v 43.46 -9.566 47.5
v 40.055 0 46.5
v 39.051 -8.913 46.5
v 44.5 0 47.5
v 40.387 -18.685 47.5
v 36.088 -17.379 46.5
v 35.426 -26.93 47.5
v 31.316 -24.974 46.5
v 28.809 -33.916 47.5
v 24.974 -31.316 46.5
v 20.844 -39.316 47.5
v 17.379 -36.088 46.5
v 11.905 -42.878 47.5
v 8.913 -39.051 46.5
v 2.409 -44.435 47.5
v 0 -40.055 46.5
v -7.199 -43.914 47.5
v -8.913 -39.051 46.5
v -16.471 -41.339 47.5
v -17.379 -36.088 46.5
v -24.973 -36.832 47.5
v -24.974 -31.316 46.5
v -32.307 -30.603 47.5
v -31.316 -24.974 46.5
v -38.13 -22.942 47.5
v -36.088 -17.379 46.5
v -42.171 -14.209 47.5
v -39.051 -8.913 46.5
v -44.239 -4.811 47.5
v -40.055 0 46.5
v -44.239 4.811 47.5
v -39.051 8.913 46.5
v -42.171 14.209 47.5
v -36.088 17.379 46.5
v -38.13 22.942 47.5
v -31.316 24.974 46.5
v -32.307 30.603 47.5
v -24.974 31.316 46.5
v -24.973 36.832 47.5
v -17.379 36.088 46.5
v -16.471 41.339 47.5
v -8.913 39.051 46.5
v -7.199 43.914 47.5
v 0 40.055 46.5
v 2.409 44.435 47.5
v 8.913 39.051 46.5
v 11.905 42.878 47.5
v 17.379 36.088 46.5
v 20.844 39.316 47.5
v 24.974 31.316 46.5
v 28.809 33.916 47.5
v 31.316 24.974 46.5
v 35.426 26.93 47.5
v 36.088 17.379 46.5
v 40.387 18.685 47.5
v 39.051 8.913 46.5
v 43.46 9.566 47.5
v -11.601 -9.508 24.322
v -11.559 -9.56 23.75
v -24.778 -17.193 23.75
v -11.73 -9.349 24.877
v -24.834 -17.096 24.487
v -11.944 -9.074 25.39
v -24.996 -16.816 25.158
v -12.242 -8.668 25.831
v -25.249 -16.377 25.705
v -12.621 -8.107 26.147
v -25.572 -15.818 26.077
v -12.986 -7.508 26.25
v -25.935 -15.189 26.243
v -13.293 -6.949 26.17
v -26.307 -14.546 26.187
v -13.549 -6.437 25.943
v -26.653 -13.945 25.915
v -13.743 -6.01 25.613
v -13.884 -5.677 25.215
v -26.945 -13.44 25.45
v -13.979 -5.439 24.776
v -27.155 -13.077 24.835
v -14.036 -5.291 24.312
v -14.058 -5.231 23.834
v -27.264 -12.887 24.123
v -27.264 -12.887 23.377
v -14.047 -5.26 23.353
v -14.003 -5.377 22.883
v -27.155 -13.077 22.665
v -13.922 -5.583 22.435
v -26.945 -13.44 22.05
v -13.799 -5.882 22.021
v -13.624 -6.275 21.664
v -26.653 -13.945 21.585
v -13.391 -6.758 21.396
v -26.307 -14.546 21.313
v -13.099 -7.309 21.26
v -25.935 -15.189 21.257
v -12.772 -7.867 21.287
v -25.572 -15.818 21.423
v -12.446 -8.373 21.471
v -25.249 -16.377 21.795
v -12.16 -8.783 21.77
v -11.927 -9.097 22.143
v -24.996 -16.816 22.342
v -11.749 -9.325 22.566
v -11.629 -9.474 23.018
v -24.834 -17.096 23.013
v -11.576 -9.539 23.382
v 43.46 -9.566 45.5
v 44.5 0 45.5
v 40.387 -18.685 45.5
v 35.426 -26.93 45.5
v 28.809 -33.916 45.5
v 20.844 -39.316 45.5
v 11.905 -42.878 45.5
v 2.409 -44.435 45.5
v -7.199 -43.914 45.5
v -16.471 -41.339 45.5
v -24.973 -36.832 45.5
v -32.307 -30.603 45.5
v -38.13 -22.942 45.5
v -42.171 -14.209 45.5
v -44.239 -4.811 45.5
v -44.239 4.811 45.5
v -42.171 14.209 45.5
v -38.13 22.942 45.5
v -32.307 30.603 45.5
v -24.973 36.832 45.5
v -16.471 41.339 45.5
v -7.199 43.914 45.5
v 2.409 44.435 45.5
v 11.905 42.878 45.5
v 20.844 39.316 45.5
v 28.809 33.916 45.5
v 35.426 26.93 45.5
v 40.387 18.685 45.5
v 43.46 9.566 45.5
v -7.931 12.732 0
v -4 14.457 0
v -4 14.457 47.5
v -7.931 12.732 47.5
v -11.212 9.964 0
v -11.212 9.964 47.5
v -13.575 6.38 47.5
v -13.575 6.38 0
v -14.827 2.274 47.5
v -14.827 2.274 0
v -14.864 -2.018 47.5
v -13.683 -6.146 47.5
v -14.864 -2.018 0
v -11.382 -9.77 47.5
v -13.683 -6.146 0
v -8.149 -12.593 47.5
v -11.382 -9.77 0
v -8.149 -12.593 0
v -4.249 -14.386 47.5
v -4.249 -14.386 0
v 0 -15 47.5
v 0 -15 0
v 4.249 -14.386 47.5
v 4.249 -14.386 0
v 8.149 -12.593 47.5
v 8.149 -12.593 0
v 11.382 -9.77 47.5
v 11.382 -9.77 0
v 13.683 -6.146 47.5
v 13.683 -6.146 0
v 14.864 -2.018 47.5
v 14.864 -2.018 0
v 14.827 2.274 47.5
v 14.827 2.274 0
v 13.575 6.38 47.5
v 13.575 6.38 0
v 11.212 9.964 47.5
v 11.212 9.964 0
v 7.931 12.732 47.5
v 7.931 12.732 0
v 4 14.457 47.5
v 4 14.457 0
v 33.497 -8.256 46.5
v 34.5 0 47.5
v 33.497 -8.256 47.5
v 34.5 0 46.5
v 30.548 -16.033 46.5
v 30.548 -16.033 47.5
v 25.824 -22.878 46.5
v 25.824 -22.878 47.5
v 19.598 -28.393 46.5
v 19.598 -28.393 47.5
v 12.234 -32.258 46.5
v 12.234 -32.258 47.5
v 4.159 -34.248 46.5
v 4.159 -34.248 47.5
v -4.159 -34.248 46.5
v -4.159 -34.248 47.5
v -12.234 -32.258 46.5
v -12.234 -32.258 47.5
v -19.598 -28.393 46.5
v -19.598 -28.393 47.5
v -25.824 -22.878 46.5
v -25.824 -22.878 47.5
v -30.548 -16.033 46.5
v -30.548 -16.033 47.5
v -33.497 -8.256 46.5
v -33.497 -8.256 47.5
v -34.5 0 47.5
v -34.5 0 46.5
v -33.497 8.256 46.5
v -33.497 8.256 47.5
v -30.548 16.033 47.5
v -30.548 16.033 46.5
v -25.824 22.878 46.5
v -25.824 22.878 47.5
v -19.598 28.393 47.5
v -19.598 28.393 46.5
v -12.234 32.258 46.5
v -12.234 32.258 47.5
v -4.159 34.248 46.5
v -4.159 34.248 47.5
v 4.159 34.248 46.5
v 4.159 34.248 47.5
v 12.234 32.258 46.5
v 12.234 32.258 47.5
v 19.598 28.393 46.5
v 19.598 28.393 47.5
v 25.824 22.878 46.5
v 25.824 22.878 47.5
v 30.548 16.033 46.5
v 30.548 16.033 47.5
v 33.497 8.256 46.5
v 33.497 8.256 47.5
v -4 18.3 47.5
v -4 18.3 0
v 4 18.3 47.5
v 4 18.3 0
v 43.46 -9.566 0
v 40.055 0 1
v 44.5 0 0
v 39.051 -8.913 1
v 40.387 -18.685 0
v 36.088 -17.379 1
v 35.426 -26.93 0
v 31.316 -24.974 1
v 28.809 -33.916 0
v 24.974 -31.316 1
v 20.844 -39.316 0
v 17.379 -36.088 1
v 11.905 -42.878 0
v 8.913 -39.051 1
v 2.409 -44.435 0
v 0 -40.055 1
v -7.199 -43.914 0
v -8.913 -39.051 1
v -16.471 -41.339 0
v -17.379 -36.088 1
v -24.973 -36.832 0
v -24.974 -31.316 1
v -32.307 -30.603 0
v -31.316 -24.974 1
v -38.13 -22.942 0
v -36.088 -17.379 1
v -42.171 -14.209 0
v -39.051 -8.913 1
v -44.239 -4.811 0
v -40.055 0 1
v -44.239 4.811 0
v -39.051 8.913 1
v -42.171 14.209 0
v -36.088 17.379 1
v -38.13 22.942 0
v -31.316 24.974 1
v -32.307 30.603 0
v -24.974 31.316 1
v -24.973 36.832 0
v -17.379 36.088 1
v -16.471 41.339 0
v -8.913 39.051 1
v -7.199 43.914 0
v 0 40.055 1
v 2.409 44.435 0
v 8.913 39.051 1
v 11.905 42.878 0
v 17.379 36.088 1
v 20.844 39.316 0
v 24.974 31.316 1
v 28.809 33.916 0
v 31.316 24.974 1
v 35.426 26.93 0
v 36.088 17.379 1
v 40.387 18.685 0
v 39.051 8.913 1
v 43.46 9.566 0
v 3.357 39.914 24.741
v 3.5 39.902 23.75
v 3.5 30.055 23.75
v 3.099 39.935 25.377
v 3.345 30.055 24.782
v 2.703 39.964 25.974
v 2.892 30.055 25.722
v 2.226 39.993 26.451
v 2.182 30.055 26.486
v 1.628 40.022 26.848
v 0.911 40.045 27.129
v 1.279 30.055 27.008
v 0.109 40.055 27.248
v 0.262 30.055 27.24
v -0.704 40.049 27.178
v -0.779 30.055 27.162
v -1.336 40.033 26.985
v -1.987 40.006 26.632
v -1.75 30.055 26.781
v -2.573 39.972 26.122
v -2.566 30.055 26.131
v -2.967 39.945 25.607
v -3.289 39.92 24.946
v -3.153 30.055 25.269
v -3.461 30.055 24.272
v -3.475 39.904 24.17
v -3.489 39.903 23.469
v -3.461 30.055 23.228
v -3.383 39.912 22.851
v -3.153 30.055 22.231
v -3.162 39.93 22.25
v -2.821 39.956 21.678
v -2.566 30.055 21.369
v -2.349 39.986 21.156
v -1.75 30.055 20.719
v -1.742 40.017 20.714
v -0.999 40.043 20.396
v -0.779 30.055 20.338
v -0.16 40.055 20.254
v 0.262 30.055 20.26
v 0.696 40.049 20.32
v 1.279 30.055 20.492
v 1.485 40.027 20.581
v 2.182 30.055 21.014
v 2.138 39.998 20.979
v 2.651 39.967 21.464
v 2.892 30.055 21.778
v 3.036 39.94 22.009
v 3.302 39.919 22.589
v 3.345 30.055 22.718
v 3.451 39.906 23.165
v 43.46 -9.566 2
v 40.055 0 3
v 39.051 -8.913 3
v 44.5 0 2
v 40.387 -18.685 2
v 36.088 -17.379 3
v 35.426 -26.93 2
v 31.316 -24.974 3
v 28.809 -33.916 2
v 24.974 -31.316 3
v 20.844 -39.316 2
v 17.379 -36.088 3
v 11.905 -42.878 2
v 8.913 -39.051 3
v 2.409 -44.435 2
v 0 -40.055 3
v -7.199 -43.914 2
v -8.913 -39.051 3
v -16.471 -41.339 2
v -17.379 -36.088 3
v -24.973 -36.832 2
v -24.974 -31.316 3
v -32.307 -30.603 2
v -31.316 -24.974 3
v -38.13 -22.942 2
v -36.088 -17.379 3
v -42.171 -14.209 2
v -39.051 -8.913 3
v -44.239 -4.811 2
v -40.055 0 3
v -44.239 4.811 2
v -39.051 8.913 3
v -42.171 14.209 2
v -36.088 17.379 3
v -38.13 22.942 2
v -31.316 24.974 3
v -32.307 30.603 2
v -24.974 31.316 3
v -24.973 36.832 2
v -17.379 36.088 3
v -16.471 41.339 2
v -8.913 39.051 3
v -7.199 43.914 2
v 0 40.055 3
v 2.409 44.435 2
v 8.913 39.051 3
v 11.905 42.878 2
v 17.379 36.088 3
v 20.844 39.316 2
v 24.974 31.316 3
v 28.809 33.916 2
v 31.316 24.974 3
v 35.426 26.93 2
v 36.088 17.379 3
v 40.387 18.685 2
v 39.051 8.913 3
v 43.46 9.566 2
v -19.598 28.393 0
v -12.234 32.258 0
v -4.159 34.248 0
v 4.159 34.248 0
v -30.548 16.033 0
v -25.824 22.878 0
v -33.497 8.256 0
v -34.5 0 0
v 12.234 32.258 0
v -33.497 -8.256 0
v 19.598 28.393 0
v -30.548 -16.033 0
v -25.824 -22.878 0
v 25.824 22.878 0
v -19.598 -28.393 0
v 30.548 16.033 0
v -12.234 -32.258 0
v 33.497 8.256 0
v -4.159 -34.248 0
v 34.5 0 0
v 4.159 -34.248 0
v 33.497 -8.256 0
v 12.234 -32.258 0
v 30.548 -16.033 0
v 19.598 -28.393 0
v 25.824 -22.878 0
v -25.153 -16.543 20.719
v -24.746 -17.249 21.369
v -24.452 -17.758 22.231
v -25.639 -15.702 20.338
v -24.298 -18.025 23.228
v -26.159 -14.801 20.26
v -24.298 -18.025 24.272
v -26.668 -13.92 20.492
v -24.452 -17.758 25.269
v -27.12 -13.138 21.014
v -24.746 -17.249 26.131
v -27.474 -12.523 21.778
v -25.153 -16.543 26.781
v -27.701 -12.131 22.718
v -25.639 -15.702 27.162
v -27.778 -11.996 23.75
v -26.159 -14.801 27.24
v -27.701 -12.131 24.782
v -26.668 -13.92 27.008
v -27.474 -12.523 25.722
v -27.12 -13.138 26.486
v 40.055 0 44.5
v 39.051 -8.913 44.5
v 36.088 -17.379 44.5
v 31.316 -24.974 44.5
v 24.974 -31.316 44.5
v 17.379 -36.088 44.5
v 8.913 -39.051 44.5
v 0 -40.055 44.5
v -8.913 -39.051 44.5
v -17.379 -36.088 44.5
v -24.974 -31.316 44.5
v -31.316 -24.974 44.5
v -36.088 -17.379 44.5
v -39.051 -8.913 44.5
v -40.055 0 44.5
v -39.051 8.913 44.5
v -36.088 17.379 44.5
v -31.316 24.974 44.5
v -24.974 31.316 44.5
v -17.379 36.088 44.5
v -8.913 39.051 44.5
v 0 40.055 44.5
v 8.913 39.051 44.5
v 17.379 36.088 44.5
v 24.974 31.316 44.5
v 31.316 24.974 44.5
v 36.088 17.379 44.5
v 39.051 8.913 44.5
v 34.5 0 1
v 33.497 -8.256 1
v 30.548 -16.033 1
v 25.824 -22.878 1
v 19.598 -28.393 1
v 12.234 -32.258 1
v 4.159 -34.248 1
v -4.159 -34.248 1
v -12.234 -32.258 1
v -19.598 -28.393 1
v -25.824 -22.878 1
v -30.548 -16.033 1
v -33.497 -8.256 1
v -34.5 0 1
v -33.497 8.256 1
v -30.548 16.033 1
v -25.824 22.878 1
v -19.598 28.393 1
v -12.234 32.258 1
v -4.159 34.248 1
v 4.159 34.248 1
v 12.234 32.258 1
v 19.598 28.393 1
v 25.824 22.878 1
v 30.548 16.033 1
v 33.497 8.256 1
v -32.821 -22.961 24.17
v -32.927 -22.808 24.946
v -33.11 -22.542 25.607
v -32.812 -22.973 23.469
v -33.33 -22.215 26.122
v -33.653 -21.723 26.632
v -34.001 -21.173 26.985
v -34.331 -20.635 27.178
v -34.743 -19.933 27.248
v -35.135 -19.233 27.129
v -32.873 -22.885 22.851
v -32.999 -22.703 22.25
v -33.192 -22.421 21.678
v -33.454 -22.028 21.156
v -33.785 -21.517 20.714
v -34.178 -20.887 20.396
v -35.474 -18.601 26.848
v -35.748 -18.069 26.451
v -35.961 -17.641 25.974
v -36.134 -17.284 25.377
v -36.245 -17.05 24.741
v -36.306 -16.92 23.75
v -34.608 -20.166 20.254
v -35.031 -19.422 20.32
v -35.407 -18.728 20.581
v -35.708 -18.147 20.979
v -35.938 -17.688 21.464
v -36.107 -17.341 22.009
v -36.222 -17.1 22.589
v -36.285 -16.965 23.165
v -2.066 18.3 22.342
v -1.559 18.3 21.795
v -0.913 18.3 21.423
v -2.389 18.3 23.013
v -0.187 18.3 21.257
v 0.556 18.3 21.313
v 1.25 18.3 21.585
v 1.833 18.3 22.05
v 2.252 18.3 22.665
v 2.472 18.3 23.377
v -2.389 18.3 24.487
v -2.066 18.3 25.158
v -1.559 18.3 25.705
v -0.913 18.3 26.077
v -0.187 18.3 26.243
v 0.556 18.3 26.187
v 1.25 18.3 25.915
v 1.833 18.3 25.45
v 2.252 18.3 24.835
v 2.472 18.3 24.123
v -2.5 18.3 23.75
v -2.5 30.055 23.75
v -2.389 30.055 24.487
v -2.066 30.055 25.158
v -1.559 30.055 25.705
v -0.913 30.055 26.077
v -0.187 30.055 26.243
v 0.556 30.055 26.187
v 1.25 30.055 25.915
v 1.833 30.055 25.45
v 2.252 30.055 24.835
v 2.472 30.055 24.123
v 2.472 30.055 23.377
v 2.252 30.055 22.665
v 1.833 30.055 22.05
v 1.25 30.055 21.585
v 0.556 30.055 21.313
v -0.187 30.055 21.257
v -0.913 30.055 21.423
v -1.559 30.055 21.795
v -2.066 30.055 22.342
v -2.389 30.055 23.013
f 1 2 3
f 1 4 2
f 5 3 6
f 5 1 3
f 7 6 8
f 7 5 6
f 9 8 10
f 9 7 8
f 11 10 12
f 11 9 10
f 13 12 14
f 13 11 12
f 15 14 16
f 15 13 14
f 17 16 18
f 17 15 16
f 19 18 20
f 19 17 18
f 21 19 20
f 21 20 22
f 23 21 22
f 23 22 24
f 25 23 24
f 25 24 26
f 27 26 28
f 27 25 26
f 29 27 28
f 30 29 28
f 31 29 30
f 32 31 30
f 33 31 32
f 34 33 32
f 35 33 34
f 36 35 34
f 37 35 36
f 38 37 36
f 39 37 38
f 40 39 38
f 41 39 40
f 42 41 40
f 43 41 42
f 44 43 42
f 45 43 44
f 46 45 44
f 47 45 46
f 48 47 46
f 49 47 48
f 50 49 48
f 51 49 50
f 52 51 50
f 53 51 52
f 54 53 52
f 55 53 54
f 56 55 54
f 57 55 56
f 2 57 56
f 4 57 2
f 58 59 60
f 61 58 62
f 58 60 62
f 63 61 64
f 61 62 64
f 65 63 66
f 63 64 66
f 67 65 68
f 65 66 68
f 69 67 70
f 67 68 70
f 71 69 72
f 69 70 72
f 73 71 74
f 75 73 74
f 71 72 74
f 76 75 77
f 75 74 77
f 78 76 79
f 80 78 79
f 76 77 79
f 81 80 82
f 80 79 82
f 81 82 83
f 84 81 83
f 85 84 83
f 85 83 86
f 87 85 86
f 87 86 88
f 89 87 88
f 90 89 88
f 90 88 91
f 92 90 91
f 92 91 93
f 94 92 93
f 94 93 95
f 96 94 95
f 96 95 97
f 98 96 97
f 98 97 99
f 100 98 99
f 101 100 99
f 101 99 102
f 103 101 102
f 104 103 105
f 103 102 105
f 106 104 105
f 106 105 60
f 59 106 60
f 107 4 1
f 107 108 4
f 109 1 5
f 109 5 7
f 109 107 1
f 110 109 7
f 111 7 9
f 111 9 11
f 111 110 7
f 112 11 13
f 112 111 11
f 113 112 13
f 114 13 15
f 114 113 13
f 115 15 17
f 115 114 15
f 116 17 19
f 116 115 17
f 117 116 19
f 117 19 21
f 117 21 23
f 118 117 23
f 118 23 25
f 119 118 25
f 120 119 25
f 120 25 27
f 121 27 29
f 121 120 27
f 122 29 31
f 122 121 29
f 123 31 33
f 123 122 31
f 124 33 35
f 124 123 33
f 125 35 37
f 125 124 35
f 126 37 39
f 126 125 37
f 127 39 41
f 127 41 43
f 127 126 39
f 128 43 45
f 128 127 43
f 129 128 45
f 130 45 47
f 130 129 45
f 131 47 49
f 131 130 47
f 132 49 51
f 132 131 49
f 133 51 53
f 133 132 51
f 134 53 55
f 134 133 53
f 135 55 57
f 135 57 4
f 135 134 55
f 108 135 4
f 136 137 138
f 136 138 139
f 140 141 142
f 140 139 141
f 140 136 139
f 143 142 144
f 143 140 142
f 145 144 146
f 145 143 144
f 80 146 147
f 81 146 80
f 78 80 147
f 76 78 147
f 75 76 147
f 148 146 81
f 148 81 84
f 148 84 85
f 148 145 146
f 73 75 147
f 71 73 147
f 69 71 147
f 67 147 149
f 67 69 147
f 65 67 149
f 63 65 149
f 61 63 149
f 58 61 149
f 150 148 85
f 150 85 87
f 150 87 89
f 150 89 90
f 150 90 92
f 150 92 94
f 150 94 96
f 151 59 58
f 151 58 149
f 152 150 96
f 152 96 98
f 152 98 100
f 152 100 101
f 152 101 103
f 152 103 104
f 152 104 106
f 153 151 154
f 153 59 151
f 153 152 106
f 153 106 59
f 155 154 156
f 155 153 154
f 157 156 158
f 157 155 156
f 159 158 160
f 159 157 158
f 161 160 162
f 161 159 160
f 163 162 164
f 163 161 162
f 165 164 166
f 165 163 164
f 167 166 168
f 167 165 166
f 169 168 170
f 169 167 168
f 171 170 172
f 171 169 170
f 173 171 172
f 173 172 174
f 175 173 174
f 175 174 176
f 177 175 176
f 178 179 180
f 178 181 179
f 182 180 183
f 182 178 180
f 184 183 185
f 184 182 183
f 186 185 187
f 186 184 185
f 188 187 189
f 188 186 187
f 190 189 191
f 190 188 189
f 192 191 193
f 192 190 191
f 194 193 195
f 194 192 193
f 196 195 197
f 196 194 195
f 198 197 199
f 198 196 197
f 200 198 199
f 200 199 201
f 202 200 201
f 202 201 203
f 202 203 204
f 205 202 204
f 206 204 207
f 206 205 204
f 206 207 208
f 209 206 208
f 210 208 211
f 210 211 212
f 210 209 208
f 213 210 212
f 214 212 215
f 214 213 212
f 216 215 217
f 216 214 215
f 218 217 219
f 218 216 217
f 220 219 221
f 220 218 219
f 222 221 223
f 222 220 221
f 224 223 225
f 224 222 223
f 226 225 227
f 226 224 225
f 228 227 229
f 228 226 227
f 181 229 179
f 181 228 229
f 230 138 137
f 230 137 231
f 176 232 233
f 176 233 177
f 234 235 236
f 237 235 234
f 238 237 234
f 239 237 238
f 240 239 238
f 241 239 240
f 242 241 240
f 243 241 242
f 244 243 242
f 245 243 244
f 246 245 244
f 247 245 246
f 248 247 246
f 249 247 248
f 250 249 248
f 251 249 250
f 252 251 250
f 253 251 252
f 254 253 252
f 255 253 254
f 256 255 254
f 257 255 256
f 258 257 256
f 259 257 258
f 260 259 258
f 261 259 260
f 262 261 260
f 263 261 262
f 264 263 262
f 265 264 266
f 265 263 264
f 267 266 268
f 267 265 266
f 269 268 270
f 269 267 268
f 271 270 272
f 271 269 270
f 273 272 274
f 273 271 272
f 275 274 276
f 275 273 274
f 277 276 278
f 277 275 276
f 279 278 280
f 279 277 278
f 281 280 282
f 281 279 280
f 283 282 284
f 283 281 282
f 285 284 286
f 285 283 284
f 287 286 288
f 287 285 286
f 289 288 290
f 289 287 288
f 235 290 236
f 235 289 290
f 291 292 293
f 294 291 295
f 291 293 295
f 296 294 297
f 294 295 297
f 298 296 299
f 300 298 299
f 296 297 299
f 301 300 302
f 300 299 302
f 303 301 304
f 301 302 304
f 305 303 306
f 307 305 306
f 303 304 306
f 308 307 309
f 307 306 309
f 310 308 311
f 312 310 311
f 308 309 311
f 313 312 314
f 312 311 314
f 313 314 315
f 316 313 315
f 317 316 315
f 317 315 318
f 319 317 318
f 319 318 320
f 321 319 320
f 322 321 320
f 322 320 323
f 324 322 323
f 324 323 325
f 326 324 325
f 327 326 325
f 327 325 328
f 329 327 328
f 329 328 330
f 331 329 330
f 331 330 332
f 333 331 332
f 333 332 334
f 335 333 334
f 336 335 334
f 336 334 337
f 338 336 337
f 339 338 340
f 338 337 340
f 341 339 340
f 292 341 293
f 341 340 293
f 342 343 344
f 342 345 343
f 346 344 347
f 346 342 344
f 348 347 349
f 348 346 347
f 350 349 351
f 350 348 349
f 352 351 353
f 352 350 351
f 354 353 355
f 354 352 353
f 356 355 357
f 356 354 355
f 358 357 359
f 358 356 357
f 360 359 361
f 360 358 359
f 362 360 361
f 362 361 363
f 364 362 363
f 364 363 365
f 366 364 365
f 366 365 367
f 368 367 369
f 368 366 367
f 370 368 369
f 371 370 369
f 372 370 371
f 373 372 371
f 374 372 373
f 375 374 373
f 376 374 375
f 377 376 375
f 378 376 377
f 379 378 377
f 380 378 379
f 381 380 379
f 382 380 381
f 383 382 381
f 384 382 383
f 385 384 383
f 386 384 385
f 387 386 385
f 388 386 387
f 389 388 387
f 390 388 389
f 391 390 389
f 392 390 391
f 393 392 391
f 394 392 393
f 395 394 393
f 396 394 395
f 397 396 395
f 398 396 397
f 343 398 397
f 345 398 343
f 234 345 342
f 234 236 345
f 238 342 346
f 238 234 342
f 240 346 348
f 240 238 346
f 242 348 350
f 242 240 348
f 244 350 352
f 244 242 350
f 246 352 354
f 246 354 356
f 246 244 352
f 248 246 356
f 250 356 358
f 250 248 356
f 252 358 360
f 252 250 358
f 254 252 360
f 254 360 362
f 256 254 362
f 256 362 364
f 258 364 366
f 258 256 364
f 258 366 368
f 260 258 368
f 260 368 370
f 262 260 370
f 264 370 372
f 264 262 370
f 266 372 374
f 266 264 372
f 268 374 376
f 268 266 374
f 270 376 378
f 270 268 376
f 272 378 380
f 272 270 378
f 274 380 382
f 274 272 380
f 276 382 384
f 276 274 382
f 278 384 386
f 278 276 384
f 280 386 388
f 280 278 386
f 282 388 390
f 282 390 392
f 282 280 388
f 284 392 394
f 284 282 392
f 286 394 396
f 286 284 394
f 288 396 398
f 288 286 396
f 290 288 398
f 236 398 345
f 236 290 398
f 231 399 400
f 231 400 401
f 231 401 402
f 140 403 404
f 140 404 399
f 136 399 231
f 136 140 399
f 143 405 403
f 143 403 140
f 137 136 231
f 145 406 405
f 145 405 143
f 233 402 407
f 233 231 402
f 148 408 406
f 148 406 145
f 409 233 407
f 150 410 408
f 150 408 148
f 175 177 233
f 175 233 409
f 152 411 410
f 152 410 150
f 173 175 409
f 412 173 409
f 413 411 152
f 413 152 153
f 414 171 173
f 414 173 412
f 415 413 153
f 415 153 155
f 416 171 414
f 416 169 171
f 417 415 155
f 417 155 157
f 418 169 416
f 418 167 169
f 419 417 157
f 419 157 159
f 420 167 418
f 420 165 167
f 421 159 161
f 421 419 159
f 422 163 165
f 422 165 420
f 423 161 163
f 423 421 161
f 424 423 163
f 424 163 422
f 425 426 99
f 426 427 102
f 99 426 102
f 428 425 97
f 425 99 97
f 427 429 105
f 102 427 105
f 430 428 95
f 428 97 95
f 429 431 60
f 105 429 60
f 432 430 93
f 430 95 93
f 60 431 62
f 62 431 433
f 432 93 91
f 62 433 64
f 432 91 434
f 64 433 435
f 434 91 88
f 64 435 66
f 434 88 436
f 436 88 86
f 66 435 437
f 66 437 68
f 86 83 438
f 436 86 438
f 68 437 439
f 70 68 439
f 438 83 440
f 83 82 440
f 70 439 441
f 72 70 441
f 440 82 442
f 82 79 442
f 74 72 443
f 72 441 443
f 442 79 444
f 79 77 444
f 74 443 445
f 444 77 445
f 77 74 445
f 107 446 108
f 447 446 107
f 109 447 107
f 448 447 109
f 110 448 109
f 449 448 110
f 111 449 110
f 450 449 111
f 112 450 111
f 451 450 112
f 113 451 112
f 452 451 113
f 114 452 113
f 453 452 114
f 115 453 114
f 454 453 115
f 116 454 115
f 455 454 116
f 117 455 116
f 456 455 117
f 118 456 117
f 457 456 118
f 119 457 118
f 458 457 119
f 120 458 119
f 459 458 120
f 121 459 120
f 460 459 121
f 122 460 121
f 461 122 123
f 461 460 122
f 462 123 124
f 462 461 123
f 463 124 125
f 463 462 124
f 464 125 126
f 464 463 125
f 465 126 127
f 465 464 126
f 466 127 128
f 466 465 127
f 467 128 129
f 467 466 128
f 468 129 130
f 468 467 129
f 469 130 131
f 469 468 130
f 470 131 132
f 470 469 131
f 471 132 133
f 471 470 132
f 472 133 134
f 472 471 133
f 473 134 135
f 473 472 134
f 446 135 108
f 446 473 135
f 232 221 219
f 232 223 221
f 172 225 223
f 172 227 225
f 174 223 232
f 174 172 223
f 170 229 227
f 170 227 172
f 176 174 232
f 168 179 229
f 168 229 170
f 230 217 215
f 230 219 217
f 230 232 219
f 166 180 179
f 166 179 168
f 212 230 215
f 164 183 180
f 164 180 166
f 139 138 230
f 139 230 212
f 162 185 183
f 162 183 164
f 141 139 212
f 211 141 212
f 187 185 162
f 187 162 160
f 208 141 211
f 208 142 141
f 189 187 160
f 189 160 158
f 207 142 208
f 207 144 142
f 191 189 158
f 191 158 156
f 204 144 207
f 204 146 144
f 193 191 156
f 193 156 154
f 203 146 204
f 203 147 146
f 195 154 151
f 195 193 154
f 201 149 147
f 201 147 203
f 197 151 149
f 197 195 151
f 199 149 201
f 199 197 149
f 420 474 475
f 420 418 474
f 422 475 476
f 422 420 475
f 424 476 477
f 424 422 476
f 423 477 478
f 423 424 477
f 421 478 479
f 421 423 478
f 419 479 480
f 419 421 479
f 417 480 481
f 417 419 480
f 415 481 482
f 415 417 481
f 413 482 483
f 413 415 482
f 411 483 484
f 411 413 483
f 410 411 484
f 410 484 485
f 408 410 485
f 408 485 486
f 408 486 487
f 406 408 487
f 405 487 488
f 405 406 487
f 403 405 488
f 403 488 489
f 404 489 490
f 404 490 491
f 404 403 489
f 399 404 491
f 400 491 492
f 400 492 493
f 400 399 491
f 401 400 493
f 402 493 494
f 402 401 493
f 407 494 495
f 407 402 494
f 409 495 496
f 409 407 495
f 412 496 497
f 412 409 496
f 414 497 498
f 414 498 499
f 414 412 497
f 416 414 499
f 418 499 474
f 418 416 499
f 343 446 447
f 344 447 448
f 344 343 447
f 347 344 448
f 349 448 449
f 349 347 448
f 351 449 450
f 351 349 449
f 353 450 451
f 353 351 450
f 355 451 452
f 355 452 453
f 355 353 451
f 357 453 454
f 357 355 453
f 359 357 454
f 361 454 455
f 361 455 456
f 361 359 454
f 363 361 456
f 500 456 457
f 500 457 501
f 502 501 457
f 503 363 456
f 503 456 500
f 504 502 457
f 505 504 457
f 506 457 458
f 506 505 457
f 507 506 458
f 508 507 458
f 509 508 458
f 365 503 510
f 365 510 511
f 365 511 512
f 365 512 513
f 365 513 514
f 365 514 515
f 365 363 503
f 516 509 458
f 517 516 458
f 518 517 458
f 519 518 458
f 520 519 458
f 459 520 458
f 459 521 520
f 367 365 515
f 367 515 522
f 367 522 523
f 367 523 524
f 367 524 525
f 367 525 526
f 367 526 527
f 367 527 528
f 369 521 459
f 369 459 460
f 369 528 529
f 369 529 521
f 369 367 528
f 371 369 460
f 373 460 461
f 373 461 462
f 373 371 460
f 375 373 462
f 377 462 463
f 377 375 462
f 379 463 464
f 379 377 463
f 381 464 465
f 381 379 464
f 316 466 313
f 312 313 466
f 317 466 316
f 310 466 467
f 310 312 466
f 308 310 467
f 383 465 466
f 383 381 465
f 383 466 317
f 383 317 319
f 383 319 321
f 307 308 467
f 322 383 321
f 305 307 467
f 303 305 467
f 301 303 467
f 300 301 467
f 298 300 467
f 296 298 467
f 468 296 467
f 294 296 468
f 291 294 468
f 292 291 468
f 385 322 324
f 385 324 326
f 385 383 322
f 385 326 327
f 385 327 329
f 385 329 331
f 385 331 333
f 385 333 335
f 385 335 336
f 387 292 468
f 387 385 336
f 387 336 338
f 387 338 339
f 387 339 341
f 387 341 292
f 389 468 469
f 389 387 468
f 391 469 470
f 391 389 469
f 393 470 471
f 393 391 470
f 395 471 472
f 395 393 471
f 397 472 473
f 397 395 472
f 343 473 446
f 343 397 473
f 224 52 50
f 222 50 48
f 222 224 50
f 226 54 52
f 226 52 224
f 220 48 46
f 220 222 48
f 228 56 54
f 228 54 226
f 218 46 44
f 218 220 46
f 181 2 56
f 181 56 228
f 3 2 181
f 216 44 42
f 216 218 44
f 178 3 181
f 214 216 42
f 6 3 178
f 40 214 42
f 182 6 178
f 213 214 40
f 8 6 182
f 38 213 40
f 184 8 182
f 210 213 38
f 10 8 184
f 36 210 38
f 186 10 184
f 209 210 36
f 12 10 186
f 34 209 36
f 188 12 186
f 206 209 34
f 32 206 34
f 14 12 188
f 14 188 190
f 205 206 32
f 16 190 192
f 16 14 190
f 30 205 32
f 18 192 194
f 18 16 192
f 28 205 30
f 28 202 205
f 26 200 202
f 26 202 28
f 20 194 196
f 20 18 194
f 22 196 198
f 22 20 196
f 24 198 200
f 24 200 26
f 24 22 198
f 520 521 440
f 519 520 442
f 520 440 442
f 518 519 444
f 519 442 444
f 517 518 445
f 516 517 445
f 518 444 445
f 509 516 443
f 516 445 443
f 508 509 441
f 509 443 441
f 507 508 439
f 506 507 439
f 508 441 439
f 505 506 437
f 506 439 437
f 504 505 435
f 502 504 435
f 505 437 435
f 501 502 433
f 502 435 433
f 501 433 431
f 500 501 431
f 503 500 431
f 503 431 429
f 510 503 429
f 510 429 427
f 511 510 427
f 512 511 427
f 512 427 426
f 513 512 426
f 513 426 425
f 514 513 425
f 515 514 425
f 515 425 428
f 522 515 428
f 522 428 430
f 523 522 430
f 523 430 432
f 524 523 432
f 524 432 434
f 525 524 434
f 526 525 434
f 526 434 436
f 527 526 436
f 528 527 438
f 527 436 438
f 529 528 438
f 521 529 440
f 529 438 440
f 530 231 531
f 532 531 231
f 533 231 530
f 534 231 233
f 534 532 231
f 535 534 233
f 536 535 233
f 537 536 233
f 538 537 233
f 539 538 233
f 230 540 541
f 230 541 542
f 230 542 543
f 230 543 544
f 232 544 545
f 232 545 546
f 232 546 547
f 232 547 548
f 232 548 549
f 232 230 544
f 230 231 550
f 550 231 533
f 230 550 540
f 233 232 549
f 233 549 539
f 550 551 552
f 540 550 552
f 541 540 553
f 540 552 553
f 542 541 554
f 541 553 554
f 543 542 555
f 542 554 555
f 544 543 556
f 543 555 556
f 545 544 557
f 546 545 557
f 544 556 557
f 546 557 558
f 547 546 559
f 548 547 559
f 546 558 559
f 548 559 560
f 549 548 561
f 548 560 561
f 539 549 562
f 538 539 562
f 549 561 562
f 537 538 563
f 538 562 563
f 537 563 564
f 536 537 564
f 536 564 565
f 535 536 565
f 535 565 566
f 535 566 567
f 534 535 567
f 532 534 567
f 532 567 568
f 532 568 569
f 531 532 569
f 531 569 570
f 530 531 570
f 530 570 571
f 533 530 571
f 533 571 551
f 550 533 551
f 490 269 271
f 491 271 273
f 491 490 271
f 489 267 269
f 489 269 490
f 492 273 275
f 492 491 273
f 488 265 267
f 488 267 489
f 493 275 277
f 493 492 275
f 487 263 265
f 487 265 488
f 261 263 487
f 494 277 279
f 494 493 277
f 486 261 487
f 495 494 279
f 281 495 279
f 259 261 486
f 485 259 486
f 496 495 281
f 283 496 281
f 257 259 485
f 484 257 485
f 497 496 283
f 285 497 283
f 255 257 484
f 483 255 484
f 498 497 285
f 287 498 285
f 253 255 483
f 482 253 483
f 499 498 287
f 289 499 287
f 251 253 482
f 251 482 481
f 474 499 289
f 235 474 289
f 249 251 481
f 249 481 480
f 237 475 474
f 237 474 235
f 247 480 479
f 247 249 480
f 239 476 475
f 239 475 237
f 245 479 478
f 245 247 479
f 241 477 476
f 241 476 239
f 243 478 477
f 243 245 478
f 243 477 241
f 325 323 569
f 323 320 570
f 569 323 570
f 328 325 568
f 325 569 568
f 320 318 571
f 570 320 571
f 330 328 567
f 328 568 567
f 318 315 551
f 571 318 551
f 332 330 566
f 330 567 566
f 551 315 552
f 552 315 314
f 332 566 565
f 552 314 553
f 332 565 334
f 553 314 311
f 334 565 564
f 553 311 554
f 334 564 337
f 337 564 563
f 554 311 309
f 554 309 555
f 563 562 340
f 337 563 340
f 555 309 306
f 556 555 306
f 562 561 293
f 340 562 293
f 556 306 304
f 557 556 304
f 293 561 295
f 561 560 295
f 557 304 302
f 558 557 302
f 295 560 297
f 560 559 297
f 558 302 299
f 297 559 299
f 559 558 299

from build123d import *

# Parameters (mm, degrees)
SKETCH2_W                    = 47.5
SKETCH2_H                    = 15
CUT_EXTRUDE1_DEPTH           = 79.846369606
F_7_0_7_DIAMETER_HOLE1_D     = 7
F_7_0_7_DIAMETER_HOLE1_DEPTH = 10
M6X1_0_TAPPED_HOLE1_REACH    = 100.969
M6X1_0_TAPPED_HOLE1_BORE_R   = 2.5
CIRPATTERN1_COUNT            = 2
CIRPATTERN1_ANGLE            = 120


with BuildPart() as part:
    # Sketch1 → Revolve1 (revolve)
    with BuildSketch(Plane(origin=(0, 0, 0), x_dir=(0, 0, -1), z_dir=(1, 0, 0)), mode=Mode.PRIVATE) as revolve1_sk:
        Polygon((-47.5, 34.5), (-46.5, 34.5), (-46.5, 40.055), (-47.5, 44.5), (-45.5, 44.5), (-44.5, 40.055), (-3, 40.055), (-2, 44.5), (0, 44.5), (-1, 40.055), (-1, 34.5), (0, 34.5), (0, 0), (-47.5, 0), align=None)
    revolve(revolve1_sk.sketch.rotate(Axis((0, 0, 52.856940479), (0, 0, -1)), 90), axis=Axis((0, 0, 52.856940479), (0, 0, -1)))

    # Sketch2 → Cut-Revolve1 (revolve, cut)
    with BuildSketch(Plane(origin=(0, 0, 0), x_dir=(0, 0, -1), z_dir=(1, 0, 0)), mode=Mode.PRIVATE) as cut_revolve1_sk:
        with Locations((-23.75, 7.5)):
            Rectangle(SKETCH2_W, SKETCH2_H)
    revolve(cut_revolve1_sk.sketch.rotate(Axis((0, 0, -27.972108766), (0, 0, 1)), 90), axis=Axis((0, 0, -27.972108766), (0, 0, 1)), mode=Mode.SUBTRACT)

    # Sketch3 → Cut-Extrude1 (cut, through all)
    with BuildSketch(Plane.XY.offset(47.5)):
        with BuildLine():
            Line((-4, 18.3), (4, 18.3))
            Line((4, 18.3), (4, 14.456832295))
            ThreePointArc((4, 14.456832295), (0, 15), (-4, 14.456832295))
            Line((-4, 14.456832295), (-4, 18.3))
        make_face()
    extrude(amount=-CUT_EXTRUDE1_DEPTH, mode=Mode.SUBTRACT)

    # Ø7.0 (7) Diameter Hole1
    with Locations(Plane(origin=(0, 40.055, 0), x_dir=(-1, 0, 0), z_dir=(0, 1, 0))):
        with Locations((0, 23.75)):
            f_7_0_7_diameter_hole1 = Hole(F_7_0_7_DIAMETER_HOLE1_D / 2, depth=F_7_0_7_DIAMETER_HOLE1_DEPTH)

    # M6x1.0 Tapped Hole1 bore → M6x1.0 Tapped Hole1 (cut, up to next)
    with BuildSketch(Plane(origin=(0, 30.055, 0), x_dir=(-1, 0, 0), z_dir=(0, 1, 0)), mode=Mode.PRIVATE) as m6x1_0_tapped_hole1_sk1:
        with Locations((0, 23.75)):
            Circle(M6X1_0_TAPPED_HOLE1_BORE_R)
    m6x1_0_tapped_hole1_tool1 = extrude(m6x1_0_tapped_hole1_sk1.sketch, amount=-M6X1_0_TAPPED_HOLE1_REACH, mode=Mode.PRIVATE) & part.part
    m6x1_0_tapped_hole1 = m6x1_0_tapped_hole1_tool1.solids().sort_by_distance((0, 30.055, 23.75))[0]
    add(m6x1_0_tapped_hole1, mode=Mode.SUBTRACT)

    # CirPattern1: Ø7.0 (7) Diameter Hole1, M6x1.0 Tapped Hole1; each copy of M6x1.0 Tapped Hole1 runs up to whatever stops it at its own place
    cirpattern1_before = part.part  # the part as the pattern finds it: every copy runs up to it
    add(f_7_0_7_diameter_hole1.rotate(Axis((0, 0, -27.972108766), (0, 0, 1)), 1 * CIRPATTERN1_ANGLE / (CIRPATTERN1_COUNT - 1)), mode=Mode.SUBTRACT)
    cirpattern1_m6x1_0_tapped_hole1_long = extrude(m6x1_0_tapped_hole1_sk1.sketch, amount=-M6X1_0_TAPPED_HOLE1_REACH, mode=Mode.PRIVATE)
    cirpattern1_m6x1_0_tapped_hole1_tool1 = cirpattern1_m6x1_0_tapped_hole1_long.rotate(Axis((0, 0, -27.972108766), (0, 0, 1)), 1 * CIRPATTERN1_ANGLE / (CIRPATTERN1_COUNT - 1)) & cirpattern1_before
    add(cirpattern1_m6x1_0_tapped_hole1_tool1.solids().sort_by_distance((-26.028394, -15.0275, 23.75))[0], mode=Mode.SUBTRACT)


solid = part.part
